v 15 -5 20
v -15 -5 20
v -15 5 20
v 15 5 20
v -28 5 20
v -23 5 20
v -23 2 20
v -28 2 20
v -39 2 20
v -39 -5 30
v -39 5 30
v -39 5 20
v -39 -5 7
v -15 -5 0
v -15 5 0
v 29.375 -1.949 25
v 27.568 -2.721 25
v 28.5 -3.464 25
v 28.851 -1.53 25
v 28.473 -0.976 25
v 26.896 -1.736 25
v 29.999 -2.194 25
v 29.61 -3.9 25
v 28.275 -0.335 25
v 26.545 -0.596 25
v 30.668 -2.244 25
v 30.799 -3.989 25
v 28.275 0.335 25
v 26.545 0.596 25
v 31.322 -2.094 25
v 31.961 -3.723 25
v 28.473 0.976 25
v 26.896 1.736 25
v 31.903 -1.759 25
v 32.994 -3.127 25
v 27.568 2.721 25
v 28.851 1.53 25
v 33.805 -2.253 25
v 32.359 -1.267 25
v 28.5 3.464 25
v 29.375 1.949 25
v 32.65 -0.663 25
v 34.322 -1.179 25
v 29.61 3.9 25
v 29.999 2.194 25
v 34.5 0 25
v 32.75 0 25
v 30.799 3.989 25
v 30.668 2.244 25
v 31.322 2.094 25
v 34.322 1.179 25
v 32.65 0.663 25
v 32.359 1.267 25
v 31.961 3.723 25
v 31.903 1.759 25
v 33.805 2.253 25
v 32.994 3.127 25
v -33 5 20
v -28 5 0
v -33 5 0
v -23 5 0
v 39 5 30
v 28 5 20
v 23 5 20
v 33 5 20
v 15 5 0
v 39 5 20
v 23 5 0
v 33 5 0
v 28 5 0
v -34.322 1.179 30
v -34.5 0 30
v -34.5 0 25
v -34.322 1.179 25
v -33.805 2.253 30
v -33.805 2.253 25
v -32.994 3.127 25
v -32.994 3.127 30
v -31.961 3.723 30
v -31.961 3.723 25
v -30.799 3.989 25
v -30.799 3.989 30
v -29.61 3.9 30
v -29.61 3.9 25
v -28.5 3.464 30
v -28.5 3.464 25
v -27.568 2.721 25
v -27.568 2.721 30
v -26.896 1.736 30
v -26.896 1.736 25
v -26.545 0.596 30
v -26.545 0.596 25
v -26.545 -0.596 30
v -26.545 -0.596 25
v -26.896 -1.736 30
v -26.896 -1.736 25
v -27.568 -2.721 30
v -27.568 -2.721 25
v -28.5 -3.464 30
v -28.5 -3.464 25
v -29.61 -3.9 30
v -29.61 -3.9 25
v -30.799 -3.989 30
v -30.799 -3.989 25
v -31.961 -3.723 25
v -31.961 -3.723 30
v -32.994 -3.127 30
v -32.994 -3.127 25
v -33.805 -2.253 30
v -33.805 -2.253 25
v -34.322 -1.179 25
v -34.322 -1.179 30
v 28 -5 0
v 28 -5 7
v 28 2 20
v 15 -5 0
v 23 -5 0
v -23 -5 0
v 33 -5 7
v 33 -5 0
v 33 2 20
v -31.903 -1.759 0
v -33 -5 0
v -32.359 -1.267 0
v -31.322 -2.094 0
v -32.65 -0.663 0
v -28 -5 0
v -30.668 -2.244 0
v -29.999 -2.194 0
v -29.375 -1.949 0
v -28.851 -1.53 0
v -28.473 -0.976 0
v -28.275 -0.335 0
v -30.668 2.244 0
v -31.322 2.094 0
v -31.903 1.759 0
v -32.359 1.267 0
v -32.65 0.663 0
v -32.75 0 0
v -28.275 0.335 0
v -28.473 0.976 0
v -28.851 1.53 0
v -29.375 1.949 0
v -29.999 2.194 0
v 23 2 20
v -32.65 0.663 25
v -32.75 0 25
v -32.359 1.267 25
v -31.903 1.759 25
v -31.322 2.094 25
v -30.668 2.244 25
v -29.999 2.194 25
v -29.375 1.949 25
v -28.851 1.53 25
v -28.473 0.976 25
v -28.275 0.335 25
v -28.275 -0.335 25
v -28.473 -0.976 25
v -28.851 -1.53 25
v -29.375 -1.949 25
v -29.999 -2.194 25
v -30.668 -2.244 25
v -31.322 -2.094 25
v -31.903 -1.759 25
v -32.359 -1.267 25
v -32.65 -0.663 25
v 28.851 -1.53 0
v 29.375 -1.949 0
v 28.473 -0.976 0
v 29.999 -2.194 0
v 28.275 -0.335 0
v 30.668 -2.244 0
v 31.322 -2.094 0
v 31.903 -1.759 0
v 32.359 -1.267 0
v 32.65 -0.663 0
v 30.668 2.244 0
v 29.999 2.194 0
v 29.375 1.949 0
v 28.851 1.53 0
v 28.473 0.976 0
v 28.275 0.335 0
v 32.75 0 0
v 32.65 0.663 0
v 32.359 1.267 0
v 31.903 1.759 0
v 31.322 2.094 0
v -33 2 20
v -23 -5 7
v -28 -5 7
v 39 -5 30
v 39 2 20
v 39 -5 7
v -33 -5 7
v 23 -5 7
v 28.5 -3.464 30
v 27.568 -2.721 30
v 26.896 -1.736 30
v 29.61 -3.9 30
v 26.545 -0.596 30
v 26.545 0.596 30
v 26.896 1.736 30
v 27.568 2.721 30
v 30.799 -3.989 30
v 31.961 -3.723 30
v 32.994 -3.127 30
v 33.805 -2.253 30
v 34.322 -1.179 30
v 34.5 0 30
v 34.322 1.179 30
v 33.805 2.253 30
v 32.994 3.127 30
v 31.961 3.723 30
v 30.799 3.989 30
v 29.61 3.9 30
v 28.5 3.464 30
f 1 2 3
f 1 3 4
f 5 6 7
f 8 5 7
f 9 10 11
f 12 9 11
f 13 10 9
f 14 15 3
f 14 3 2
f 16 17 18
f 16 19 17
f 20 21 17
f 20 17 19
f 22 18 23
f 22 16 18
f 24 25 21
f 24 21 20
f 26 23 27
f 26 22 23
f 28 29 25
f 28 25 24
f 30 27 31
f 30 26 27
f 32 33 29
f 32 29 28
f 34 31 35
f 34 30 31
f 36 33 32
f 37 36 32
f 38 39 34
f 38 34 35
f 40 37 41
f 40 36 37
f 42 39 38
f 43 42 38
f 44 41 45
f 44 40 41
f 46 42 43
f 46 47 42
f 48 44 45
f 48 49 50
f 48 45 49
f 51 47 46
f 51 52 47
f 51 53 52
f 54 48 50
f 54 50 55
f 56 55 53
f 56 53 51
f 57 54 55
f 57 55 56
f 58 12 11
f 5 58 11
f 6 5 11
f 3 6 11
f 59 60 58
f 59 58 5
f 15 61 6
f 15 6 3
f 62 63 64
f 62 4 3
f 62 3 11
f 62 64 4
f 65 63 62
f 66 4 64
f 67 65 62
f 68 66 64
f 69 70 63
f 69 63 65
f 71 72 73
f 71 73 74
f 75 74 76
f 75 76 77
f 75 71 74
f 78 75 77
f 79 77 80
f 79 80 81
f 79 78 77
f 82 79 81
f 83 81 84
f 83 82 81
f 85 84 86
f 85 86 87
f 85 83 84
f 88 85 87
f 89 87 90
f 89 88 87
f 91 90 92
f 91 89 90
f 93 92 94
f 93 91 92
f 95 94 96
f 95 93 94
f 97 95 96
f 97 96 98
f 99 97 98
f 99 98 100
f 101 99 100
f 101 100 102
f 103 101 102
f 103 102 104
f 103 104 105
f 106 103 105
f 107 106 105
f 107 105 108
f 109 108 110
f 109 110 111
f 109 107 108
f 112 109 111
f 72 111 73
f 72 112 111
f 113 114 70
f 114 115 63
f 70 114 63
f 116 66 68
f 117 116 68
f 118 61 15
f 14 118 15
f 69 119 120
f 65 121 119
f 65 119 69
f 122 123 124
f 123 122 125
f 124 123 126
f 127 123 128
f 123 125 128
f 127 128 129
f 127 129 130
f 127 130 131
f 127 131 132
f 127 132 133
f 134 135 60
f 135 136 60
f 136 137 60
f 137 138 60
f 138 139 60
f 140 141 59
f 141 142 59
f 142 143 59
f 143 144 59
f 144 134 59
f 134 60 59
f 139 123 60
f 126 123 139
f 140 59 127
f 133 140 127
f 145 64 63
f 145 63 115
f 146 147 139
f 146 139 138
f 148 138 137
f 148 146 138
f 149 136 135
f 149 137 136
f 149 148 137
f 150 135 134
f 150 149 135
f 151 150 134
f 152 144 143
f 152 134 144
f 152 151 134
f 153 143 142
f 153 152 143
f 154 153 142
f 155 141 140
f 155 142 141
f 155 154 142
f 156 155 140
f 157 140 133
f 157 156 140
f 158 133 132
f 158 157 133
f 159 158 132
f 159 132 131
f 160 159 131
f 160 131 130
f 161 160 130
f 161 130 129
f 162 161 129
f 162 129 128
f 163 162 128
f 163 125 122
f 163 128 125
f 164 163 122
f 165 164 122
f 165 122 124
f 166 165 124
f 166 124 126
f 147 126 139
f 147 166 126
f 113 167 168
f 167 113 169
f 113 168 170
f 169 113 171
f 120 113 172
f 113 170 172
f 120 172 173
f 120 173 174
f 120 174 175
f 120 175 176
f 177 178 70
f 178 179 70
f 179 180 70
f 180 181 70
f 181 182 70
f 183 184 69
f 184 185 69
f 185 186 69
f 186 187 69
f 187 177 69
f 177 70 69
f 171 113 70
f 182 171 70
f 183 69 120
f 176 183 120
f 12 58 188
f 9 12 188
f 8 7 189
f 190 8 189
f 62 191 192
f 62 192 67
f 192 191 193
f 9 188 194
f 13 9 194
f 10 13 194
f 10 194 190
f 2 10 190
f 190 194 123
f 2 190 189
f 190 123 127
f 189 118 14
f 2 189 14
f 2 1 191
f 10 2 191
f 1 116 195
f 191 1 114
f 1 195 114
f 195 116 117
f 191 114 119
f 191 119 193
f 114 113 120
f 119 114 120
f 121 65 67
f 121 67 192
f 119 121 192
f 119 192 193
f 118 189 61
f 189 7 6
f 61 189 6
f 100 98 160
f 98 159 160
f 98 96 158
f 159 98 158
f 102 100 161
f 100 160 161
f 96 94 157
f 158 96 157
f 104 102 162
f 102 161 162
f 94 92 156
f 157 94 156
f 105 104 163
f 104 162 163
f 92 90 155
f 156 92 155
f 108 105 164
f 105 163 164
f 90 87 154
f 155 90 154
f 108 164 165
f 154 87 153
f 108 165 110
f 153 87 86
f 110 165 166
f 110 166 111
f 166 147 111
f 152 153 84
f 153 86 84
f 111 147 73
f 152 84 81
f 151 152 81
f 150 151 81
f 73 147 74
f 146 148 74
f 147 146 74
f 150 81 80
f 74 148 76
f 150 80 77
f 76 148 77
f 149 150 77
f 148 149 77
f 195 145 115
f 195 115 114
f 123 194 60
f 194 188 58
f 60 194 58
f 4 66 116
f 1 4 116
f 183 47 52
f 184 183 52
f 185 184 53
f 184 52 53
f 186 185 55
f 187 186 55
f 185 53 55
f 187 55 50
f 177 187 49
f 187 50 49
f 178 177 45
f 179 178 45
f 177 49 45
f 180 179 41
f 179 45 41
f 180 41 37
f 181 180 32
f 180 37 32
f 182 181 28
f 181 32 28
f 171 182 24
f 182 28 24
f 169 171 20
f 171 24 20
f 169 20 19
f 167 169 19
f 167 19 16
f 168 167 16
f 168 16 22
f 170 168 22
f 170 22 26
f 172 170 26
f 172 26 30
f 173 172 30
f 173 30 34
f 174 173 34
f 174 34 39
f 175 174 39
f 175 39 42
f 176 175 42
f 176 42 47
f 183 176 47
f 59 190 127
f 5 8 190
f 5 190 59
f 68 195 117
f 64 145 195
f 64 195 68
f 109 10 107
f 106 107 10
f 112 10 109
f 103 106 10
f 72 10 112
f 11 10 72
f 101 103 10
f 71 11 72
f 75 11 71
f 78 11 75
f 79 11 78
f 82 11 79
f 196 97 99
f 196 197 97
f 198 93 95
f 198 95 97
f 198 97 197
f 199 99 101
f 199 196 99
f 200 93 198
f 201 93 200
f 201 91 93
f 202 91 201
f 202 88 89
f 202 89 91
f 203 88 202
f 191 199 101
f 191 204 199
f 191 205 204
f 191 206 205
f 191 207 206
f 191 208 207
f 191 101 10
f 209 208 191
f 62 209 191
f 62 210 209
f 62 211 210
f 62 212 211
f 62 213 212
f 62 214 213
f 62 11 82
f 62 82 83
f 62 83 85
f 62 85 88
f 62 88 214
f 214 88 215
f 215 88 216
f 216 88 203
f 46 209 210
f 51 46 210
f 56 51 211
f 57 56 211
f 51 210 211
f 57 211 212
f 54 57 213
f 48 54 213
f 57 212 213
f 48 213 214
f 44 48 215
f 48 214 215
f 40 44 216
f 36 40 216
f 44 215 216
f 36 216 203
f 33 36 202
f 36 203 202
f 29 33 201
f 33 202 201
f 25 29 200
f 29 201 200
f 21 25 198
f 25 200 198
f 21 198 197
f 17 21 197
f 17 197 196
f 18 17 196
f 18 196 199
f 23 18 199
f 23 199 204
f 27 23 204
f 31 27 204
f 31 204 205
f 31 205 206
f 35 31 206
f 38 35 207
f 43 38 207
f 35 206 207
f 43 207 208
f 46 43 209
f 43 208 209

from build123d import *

# Parameters (mm, degrees)
SKETCH_W        = 78
SKETCH_H        = 10
PAD_DEPTH       = 30
POCKET_DEPTH    = 5
POCKET001_DEPTH = 174.334003
SKETCH003_R     = 2.25
POCKET002_DEPTH = 198.334003
SKETCH004_R     = 4
POCKET003_DEPTH = 5
SKETCH005_W     = 30
SKETCH005_H     = 10
POCKET004_DEPTH = 20


with BuildPart() as part:
    # Sketch → Pad (new body)
    with BuildSketch(Plane.XY):
        Rectangle(SKETCH_W, SKETCH_H)
    extrude(amount=PAD_DEPTH)

    # Sketch001 (on DatumPlane) → Pocket (cut)
    with BuildSketch(Plane.YZ.offset(23)):
        Polygon((-5, 0), (5, 0), (5, 20), (2, 20), (-5, 7), align=None)
    pocket = extrude(amount=POCKET_DEPTH, mode=Mode.SUBTRACT)

    # Sketch002 (on DatumPlane) → Pocket001 (cut, through all)
    with BuildSketch(Plane.YZ.offset(33)):
        Polygon((-5, 0), (5, 0), (5, 20), (2, 20), (-5, 7), align=None)
    pocket001 = extrude(amount=POCKET001_DEPTH, mode=Mode.SUBTRACT)

    # Sketch003 (on Face5 of Pocket001) → Pocket002 (cut, through all)
    with BuildSketch(Plane.XY.offset(30)):
        with Locations((30.5, 0)):
            Circle(SKETCH003_R)
    pocket002 = extrude(amount=-POCKET002_DEPTH, mode=Mode.SUBTRACT)

    # Sketch004 (on Face5 of Pocket002) → Pocket003 (cut)
    with BuildSketch(Plane.XY.offset(30)):
        with Locations((30.5, 0)):
            Circle(SKETCH004_R)
    pocket003 = extrude(amount=-POCKET003_DEPTH, mode=Mode.SUBTRACT)

    # Mirrored: Pocket003, Pocket002, Pocket001, Pocket across YZ
    add(pocket003.mirror(Plane.YZ), mode=Mode.SUBTRACT)
    add(pocket002.mirror(Plane.YZ), mode=Mode.SUBTRACT)
    add(pocket001.mirror(Plane.YZ), mode=Mode.SUBTRACT)
    add(pocket.mirror(Plane.YZ), mode=Mode.SUBTRACT)

    # Sketch005 (on Face12 of Mirrored) → Pocket004 (cut)
    with BuildSketch(Plane(origin=(0, 0, 0), x_dir=(1, 0, 0), z_dir=(0, 0, -1))):
        Rectangle(SKETCH005_W, SKETCH005_H)
    extrude(amount=-POCKET004_DEPTH, mode=Mode.SUBTRACT)


solid = part.part
